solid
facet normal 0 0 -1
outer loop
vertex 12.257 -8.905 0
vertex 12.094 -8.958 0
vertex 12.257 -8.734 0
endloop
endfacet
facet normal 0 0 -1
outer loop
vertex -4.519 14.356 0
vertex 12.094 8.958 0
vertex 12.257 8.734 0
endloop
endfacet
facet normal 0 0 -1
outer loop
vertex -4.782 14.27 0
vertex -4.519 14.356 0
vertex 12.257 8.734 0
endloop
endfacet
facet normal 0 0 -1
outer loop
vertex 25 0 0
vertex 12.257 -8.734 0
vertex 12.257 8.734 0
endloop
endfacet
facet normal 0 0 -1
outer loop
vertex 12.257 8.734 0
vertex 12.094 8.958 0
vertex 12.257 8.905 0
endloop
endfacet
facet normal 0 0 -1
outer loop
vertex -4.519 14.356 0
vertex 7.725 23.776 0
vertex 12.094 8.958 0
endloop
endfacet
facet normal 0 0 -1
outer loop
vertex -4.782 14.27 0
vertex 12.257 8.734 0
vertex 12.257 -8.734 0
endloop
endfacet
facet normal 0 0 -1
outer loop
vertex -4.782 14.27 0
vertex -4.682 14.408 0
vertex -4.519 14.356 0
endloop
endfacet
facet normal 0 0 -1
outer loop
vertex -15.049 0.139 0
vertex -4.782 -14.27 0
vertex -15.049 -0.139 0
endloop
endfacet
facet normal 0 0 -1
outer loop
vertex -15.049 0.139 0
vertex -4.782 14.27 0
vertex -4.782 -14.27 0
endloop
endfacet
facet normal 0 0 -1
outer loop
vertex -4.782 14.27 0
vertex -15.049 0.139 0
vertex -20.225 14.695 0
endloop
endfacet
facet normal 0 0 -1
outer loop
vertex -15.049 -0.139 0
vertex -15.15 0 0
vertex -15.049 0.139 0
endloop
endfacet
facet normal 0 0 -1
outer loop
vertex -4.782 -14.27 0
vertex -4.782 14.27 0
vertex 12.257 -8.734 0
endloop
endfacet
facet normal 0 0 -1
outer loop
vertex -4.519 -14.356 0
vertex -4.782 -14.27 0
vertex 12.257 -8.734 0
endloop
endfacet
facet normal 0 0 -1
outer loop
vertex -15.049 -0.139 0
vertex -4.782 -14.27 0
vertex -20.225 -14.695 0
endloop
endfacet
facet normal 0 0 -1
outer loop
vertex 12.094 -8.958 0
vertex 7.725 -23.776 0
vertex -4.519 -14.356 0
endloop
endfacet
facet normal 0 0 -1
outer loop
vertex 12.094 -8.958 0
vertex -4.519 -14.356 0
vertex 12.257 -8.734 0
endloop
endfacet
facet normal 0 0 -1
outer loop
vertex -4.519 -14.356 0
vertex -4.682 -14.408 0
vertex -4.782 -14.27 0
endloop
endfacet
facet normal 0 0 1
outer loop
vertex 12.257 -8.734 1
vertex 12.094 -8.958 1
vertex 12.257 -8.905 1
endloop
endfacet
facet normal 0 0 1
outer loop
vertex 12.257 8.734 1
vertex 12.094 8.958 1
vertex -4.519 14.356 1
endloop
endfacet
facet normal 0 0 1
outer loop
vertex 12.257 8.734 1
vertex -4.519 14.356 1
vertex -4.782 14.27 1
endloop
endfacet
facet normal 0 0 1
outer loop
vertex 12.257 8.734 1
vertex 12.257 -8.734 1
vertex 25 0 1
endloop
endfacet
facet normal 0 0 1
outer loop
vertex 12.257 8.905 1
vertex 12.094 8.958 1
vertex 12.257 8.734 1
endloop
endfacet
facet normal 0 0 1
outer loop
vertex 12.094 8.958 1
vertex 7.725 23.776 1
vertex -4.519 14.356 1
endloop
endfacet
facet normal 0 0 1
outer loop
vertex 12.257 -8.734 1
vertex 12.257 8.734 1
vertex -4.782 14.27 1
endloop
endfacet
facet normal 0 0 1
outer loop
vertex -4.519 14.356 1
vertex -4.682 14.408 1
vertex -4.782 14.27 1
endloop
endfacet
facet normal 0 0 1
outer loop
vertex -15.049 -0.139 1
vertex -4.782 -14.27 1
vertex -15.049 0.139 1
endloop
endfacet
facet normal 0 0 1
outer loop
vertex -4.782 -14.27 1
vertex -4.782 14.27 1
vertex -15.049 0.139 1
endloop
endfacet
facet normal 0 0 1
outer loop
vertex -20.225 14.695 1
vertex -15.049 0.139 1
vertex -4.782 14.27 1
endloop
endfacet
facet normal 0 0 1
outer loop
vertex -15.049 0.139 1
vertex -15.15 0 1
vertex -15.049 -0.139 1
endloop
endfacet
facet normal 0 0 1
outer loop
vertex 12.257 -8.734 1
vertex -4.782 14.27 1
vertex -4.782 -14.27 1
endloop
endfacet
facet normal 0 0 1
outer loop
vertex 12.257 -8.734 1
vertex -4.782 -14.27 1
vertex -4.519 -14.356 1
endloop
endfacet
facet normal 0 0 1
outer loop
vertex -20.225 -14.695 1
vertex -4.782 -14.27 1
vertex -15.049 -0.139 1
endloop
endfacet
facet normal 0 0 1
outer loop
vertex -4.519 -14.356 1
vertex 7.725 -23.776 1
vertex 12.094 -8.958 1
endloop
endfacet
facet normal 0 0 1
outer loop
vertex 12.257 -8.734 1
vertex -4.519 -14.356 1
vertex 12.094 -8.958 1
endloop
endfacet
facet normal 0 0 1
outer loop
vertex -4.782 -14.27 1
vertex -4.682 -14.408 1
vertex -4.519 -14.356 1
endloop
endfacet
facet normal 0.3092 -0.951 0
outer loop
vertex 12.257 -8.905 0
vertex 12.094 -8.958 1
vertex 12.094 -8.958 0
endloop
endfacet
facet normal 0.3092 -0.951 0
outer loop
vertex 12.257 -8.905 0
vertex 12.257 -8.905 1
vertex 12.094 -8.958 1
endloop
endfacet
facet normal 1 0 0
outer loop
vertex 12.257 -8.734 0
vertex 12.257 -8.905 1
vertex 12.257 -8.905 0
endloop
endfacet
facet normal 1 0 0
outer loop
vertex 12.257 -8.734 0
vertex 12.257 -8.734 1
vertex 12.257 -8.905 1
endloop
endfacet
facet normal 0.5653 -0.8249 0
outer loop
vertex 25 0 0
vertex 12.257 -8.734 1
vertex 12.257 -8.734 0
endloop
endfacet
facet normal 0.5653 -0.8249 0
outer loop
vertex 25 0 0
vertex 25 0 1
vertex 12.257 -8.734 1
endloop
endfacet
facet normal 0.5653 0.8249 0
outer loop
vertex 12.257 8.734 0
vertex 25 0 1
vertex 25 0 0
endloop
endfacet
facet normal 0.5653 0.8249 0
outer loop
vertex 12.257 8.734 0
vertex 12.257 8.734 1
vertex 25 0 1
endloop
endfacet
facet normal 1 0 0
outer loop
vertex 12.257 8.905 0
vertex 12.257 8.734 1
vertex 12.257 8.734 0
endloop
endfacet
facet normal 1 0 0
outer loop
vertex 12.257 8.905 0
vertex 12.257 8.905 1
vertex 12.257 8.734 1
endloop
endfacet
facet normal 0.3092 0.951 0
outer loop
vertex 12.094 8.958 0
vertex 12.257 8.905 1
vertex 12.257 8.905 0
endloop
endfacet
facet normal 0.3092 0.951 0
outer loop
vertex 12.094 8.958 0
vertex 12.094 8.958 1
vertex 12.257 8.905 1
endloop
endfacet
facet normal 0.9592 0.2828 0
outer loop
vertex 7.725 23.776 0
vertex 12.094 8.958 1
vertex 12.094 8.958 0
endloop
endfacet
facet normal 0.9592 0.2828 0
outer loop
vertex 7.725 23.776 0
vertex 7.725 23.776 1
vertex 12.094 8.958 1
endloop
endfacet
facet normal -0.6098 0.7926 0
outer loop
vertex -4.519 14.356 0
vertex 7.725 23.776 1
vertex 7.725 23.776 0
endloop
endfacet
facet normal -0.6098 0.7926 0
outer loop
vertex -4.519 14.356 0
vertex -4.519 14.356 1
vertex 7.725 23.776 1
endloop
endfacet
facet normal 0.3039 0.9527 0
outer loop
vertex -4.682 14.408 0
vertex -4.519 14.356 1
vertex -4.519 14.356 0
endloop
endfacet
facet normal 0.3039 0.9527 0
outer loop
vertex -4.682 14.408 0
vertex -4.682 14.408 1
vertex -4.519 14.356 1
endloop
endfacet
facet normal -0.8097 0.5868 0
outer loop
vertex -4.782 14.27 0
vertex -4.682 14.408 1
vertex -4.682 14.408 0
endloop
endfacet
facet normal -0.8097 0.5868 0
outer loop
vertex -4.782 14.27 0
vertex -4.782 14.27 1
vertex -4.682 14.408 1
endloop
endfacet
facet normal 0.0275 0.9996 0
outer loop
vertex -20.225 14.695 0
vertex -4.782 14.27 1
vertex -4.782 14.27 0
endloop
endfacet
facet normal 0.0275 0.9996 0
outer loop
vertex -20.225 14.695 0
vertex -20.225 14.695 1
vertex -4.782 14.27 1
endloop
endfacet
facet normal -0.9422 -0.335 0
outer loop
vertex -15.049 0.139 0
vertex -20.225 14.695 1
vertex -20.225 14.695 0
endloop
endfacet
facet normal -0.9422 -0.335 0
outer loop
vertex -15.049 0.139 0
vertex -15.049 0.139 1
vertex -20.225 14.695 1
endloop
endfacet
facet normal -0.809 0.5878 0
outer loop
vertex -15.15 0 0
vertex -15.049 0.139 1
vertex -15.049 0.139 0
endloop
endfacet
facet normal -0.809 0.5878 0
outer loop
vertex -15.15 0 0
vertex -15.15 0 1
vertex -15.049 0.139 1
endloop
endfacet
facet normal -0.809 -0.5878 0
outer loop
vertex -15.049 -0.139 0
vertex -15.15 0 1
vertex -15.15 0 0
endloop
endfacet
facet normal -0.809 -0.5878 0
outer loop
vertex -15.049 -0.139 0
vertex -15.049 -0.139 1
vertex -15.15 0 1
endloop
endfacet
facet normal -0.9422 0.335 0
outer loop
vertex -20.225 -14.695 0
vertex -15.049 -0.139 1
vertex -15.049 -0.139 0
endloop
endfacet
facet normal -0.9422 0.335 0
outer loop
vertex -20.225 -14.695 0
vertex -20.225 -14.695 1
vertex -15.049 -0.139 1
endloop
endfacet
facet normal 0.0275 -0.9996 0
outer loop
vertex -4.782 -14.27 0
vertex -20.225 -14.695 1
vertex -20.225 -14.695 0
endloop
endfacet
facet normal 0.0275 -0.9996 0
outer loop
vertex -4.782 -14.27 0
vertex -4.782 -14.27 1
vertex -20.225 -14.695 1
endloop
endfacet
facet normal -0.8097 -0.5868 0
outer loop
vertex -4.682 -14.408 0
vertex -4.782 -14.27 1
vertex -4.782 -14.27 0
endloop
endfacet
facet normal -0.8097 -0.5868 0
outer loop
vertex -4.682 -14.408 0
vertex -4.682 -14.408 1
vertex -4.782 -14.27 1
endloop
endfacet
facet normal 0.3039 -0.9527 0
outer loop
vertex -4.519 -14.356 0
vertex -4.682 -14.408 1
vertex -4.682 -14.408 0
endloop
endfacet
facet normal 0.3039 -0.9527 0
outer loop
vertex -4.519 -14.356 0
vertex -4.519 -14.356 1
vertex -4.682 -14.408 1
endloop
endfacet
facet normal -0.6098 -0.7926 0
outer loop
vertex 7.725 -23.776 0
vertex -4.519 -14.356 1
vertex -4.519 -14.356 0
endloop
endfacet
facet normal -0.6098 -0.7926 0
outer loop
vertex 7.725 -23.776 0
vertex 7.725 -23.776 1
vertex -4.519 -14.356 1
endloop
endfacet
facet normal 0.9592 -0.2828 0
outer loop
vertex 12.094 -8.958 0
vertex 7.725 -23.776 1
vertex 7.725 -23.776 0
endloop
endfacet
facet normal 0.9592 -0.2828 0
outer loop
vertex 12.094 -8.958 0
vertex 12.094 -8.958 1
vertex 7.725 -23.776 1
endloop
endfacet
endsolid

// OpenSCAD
// [FL_INDEX: keywords="openscad, 3d_parametric, customizable_star, csg_solid" | COT="Parametric OpenSCAD design from 3DCodeverse"]
// Title: customizable star

number_of_points=5;//[5,6,7,8,9,10,11,12,13,14,15,16,17,18,19,20,21,22,23,24]
height=1;//[1:10]
inner_radius=15;//[15:30]
outer_radius=10;//[1:50]

parametric_star(number_of_points, height, inner_radius, inner_radius+outer_radius) ;


module parametric_star(N=5, h=3, ri=15, re=30) {

  //-- Calculate and draw a 2D tip of the star
 //-- INPUT: 
 //-- n: Number of the tip (from 0 to N-1)
  module tipstar(n) {
     i1 =  [ri*cos(-360*n/N+360/(N*2)), ri*sin(-360*n/N+360/(N*2))];
    e1 = [re*cos(-360*n/N), re*sin(-360*n/N)];
    i2 = [ri*cos(-360*(n+1)/N+360/(N*2)), ri*sin(-360*(n+1)/N+360/(N*2))];
    polygon([ i1, e1, i2]);
  }

  //-- Draw the 2D star and extrude
  
   //-- The star is the union of N 2D tips. 
   //-- A inner cylinder is also needed for filling
   //-- A flat (2D) star is built. The it is extruded
    linear_extrude(height=h) 
    union() {
      for (i=[0:N-1]) {
         tipstar(i);
      }
      rotate([0,0,360/(2*N)]) circle(r=ri+ri*0.01,$fn=N);
    }
}

//-- Parametric star
//-- (c)  2010 Juan Gonzalez-Gomez (Obijuan) juan@iearobotics.com
//-- GPL license

//-- The 2*N points of an N-ponted star are calculated as follows:
//-- There are two circunferences:  the inner and outer.  Outer points are located
//-- at angles: 0, 360/N, 360*2/N and on the outer circunference
//-- The inner points have the same angular distance but they are 360/(2*N) rotated
//-- respect to the outers. They are located on the inner circunference
